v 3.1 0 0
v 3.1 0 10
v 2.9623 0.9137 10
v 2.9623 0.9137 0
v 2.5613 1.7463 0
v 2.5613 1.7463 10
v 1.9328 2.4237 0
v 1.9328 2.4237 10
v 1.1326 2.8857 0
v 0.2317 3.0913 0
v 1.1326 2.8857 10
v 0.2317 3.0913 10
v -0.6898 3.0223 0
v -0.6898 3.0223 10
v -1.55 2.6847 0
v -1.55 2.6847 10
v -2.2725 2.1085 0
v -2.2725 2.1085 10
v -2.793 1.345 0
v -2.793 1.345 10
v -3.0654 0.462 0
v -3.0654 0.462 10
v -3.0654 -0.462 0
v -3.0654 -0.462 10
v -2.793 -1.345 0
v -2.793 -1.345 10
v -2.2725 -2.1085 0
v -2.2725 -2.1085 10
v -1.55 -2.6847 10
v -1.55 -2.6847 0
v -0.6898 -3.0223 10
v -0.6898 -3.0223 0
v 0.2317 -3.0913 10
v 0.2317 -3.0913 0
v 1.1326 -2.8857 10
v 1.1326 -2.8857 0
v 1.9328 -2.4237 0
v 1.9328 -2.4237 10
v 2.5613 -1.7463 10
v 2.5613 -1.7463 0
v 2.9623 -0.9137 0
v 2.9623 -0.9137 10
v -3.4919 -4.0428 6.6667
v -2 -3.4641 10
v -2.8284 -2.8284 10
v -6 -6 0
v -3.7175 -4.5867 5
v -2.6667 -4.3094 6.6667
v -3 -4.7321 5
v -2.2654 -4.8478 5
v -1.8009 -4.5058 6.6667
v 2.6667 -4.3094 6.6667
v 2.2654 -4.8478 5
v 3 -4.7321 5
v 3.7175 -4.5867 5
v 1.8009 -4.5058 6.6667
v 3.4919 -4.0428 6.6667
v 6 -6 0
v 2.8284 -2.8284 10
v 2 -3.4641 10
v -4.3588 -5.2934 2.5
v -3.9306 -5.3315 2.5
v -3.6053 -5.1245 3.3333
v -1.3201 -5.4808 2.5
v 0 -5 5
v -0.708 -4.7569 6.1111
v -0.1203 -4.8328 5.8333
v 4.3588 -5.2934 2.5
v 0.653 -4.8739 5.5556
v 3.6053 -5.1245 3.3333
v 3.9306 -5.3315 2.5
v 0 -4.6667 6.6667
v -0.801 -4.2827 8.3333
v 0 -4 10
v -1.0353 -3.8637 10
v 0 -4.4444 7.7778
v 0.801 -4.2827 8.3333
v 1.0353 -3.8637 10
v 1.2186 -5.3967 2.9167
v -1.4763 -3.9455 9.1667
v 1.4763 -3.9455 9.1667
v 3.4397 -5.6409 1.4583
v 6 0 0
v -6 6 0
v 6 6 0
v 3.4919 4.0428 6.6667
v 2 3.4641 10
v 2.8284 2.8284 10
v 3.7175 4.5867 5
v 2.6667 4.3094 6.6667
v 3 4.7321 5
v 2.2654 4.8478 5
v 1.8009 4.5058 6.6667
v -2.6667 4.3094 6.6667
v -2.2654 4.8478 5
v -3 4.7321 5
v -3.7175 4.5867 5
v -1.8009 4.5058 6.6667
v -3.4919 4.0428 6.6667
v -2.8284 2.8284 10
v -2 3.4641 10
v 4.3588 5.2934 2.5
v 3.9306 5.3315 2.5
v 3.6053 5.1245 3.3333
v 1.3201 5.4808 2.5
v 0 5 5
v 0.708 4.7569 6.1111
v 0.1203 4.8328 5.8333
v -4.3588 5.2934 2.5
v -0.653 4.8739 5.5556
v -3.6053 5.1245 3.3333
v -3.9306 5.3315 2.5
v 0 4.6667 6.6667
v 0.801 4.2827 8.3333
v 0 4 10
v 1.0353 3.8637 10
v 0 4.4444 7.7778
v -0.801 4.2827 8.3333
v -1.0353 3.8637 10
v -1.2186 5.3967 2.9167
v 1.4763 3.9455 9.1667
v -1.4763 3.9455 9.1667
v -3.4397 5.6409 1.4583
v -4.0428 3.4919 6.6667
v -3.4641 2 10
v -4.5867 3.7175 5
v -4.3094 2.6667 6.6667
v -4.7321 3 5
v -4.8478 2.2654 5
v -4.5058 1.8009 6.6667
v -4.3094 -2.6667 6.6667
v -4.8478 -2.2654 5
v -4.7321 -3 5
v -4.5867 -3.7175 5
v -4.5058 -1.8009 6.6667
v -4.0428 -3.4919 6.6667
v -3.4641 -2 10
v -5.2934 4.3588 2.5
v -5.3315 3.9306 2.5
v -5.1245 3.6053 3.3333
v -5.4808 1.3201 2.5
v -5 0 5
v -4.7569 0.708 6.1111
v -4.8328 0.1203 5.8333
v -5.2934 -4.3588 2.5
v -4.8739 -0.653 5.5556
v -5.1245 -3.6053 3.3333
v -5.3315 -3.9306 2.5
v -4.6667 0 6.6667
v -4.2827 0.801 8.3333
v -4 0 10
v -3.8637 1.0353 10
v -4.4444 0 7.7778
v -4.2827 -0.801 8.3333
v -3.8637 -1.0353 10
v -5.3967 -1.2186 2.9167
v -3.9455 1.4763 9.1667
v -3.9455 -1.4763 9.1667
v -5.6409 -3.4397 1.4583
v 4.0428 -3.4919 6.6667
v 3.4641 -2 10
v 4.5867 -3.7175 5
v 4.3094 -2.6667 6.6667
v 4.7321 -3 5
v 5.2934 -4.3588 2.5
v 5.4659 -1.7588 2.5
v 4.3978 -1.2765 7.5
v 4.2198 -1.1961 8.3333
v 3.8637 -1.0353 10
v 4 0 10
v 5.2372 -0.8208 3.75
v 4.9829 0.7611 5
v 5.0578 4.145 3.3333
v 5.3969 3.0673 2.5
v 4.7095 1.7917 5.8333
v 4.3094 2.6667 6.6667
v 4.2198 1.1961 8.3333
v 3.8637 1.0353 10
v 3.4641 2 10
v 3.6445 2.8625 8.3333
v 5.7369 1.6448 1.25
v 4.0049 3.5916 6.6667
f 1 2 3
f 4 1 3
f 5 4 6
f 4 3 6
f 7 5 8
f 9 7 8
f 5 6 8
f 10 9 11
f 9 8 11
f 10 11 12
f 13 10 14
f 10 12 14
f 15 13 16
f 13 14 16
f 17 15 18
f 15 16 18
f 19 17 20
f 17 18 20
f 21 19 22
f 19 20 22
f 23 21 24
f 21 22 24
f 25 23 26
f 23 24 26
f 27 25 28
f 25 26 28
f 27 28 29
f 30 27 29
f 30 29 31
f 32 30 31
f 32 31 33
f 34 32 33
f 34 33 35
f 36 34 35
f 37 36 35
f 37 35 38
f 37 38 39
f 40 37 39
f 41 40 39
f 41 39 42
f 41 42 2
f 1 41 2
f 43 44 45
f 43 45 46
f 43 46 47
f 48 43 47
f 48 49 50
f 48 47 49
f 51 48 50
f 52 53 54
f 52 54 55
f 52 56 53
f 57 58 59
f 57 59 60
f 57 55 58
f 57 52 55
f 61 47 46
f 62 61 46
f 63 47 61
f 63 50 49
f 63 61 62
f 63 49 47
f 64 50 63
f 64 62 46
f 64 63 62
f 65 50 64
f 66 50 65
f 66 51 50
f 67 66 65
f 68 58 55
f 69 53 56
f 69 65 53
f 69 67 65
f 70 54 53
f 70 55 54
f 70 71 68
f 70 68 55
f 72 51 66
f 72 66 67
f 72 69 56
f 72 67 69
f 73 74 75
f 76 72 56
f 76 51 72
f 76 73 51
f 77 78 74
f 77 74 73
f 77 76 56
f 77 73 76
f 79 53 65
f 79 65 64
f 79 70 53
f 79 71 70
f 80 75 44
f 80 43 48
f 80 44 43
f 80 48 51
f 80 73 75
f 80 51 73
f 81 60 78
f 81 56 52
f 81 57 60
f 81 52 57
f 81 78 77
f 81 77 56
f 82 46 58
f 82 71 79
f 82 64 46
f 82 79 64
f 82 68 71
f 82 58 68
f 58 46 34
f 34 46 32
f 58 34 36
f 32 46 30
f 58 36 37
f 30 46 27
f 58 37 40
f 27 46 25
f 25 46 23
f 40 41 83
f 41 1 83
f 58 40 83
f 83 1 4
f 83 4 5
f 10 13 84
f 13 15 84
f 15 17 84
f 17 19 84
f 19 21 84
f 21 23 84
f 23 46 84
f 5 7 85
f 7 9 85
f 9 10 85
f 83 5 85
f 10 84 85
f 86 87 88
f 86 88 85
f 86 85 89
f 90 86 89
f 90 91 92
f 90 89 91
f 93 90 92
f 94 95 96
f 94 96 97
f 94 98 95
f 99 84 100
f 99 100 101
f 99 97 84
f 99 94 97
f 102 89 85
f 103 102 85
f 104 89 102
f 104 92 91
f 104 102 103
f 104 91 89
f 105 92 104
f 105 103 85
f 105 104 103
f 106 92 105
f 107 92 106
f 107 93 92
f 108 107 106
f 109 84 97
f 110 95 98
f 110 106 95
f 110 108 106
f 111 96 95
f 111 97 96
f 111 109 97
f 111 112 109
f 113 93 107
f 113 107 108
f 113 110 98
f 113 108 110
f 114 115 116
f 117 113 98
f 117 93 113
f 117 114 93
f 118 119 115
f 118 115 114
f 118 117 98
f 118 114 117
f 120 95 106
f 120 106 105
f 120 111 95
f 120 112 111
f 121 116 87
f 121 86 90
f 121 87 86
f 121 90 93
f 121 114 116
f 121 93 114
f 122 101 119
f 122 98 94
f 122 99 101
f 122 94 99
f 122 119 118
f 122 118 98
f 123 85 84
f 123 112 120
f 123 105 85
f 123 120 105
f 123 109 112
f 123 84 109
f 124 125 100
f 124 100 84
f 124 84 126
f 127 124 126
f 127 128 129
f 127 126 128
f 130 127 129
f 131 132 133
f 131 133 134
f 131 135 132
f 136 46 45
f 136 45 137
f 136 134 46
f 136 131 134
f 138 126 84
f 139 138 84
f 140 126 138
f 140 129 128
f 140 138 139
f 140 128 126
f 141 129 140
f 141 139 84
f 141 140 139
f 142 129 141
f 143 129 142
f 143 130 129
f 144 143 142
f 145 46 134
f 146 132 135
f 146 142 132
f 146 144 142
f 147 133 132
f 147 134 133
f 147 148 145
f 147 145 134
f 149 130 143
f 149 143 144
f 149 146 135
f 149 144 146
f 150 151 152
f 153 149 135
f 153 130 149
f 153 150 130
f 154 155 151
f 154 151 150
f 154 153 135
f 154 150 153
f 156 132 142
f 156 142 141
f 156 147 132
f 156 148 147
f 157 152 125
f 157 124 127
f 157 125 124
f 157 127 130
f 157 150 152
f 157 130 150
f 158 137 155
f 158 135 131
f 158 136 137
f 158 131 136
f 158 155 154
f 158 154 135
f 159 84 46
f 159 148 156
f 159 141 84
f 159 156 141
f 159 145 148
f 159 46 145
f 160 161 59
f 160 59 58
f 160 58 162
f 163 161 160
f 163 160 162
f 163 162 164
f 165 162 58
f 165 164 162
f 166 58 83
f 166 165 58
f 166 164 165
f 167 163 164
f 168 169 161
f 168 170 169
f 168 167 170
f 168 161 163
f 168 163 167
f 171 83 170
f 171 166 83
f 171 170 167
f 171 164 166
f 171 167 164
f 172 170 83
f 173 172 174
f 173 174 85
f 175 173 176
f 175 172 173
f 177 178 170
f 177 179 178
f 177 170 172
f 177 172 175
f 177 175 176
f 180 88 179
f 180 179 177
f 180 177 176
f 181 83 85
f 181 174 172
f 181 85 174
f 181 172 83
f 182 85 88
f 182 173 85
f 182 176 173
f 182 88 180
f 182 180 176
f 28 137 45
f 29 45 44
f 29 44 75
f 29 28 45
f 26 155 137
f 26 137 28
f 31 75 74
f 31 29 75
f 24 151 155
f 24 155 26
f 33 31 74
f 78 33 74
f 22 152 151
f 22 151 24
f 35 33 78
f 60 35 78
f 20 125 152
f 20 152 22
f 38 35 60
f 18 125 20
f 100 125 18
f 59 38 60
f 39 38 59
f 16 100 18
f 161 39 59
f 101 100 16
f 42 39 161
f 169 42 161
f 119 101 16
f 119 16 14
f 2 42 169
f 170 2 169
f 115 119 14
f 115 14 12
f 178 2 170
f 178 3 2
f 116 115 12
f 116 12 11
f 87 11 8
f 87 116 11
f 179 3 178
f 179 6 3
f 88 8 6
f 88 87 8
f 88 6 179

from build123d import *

# Parameters (mm, degrees)
SKETCH_W     = 12
SKETCH_H     = 12
SKETCH001_R  = 4
SKETCH002_R  = 3.1
POCKET_DEPTH = 10.001


with BuildPart() as part:
    # Sketch → AdditiveLoft section 0
    with BuildSketch(Plane.XY):
        Rectangle(SKETCH_W, SKETCH_H)
    # Sketch001 (on DatumPlane) → AdditiveLoft section 1
    with BuildSketch(Plane.XY.offset(10)):
        Circle(SKETCH001_R)
    loft()

    # Sketch002 (on DatumPlane) → Pocket (cut, through all)
    with BuildSketch(Plane.XY.offset(10)):
        Circle(SKETCH002_R)
    extrude(amount=-POCKET_DEPTH, mode=Mode.SUBTRACT)


solid = part.part
